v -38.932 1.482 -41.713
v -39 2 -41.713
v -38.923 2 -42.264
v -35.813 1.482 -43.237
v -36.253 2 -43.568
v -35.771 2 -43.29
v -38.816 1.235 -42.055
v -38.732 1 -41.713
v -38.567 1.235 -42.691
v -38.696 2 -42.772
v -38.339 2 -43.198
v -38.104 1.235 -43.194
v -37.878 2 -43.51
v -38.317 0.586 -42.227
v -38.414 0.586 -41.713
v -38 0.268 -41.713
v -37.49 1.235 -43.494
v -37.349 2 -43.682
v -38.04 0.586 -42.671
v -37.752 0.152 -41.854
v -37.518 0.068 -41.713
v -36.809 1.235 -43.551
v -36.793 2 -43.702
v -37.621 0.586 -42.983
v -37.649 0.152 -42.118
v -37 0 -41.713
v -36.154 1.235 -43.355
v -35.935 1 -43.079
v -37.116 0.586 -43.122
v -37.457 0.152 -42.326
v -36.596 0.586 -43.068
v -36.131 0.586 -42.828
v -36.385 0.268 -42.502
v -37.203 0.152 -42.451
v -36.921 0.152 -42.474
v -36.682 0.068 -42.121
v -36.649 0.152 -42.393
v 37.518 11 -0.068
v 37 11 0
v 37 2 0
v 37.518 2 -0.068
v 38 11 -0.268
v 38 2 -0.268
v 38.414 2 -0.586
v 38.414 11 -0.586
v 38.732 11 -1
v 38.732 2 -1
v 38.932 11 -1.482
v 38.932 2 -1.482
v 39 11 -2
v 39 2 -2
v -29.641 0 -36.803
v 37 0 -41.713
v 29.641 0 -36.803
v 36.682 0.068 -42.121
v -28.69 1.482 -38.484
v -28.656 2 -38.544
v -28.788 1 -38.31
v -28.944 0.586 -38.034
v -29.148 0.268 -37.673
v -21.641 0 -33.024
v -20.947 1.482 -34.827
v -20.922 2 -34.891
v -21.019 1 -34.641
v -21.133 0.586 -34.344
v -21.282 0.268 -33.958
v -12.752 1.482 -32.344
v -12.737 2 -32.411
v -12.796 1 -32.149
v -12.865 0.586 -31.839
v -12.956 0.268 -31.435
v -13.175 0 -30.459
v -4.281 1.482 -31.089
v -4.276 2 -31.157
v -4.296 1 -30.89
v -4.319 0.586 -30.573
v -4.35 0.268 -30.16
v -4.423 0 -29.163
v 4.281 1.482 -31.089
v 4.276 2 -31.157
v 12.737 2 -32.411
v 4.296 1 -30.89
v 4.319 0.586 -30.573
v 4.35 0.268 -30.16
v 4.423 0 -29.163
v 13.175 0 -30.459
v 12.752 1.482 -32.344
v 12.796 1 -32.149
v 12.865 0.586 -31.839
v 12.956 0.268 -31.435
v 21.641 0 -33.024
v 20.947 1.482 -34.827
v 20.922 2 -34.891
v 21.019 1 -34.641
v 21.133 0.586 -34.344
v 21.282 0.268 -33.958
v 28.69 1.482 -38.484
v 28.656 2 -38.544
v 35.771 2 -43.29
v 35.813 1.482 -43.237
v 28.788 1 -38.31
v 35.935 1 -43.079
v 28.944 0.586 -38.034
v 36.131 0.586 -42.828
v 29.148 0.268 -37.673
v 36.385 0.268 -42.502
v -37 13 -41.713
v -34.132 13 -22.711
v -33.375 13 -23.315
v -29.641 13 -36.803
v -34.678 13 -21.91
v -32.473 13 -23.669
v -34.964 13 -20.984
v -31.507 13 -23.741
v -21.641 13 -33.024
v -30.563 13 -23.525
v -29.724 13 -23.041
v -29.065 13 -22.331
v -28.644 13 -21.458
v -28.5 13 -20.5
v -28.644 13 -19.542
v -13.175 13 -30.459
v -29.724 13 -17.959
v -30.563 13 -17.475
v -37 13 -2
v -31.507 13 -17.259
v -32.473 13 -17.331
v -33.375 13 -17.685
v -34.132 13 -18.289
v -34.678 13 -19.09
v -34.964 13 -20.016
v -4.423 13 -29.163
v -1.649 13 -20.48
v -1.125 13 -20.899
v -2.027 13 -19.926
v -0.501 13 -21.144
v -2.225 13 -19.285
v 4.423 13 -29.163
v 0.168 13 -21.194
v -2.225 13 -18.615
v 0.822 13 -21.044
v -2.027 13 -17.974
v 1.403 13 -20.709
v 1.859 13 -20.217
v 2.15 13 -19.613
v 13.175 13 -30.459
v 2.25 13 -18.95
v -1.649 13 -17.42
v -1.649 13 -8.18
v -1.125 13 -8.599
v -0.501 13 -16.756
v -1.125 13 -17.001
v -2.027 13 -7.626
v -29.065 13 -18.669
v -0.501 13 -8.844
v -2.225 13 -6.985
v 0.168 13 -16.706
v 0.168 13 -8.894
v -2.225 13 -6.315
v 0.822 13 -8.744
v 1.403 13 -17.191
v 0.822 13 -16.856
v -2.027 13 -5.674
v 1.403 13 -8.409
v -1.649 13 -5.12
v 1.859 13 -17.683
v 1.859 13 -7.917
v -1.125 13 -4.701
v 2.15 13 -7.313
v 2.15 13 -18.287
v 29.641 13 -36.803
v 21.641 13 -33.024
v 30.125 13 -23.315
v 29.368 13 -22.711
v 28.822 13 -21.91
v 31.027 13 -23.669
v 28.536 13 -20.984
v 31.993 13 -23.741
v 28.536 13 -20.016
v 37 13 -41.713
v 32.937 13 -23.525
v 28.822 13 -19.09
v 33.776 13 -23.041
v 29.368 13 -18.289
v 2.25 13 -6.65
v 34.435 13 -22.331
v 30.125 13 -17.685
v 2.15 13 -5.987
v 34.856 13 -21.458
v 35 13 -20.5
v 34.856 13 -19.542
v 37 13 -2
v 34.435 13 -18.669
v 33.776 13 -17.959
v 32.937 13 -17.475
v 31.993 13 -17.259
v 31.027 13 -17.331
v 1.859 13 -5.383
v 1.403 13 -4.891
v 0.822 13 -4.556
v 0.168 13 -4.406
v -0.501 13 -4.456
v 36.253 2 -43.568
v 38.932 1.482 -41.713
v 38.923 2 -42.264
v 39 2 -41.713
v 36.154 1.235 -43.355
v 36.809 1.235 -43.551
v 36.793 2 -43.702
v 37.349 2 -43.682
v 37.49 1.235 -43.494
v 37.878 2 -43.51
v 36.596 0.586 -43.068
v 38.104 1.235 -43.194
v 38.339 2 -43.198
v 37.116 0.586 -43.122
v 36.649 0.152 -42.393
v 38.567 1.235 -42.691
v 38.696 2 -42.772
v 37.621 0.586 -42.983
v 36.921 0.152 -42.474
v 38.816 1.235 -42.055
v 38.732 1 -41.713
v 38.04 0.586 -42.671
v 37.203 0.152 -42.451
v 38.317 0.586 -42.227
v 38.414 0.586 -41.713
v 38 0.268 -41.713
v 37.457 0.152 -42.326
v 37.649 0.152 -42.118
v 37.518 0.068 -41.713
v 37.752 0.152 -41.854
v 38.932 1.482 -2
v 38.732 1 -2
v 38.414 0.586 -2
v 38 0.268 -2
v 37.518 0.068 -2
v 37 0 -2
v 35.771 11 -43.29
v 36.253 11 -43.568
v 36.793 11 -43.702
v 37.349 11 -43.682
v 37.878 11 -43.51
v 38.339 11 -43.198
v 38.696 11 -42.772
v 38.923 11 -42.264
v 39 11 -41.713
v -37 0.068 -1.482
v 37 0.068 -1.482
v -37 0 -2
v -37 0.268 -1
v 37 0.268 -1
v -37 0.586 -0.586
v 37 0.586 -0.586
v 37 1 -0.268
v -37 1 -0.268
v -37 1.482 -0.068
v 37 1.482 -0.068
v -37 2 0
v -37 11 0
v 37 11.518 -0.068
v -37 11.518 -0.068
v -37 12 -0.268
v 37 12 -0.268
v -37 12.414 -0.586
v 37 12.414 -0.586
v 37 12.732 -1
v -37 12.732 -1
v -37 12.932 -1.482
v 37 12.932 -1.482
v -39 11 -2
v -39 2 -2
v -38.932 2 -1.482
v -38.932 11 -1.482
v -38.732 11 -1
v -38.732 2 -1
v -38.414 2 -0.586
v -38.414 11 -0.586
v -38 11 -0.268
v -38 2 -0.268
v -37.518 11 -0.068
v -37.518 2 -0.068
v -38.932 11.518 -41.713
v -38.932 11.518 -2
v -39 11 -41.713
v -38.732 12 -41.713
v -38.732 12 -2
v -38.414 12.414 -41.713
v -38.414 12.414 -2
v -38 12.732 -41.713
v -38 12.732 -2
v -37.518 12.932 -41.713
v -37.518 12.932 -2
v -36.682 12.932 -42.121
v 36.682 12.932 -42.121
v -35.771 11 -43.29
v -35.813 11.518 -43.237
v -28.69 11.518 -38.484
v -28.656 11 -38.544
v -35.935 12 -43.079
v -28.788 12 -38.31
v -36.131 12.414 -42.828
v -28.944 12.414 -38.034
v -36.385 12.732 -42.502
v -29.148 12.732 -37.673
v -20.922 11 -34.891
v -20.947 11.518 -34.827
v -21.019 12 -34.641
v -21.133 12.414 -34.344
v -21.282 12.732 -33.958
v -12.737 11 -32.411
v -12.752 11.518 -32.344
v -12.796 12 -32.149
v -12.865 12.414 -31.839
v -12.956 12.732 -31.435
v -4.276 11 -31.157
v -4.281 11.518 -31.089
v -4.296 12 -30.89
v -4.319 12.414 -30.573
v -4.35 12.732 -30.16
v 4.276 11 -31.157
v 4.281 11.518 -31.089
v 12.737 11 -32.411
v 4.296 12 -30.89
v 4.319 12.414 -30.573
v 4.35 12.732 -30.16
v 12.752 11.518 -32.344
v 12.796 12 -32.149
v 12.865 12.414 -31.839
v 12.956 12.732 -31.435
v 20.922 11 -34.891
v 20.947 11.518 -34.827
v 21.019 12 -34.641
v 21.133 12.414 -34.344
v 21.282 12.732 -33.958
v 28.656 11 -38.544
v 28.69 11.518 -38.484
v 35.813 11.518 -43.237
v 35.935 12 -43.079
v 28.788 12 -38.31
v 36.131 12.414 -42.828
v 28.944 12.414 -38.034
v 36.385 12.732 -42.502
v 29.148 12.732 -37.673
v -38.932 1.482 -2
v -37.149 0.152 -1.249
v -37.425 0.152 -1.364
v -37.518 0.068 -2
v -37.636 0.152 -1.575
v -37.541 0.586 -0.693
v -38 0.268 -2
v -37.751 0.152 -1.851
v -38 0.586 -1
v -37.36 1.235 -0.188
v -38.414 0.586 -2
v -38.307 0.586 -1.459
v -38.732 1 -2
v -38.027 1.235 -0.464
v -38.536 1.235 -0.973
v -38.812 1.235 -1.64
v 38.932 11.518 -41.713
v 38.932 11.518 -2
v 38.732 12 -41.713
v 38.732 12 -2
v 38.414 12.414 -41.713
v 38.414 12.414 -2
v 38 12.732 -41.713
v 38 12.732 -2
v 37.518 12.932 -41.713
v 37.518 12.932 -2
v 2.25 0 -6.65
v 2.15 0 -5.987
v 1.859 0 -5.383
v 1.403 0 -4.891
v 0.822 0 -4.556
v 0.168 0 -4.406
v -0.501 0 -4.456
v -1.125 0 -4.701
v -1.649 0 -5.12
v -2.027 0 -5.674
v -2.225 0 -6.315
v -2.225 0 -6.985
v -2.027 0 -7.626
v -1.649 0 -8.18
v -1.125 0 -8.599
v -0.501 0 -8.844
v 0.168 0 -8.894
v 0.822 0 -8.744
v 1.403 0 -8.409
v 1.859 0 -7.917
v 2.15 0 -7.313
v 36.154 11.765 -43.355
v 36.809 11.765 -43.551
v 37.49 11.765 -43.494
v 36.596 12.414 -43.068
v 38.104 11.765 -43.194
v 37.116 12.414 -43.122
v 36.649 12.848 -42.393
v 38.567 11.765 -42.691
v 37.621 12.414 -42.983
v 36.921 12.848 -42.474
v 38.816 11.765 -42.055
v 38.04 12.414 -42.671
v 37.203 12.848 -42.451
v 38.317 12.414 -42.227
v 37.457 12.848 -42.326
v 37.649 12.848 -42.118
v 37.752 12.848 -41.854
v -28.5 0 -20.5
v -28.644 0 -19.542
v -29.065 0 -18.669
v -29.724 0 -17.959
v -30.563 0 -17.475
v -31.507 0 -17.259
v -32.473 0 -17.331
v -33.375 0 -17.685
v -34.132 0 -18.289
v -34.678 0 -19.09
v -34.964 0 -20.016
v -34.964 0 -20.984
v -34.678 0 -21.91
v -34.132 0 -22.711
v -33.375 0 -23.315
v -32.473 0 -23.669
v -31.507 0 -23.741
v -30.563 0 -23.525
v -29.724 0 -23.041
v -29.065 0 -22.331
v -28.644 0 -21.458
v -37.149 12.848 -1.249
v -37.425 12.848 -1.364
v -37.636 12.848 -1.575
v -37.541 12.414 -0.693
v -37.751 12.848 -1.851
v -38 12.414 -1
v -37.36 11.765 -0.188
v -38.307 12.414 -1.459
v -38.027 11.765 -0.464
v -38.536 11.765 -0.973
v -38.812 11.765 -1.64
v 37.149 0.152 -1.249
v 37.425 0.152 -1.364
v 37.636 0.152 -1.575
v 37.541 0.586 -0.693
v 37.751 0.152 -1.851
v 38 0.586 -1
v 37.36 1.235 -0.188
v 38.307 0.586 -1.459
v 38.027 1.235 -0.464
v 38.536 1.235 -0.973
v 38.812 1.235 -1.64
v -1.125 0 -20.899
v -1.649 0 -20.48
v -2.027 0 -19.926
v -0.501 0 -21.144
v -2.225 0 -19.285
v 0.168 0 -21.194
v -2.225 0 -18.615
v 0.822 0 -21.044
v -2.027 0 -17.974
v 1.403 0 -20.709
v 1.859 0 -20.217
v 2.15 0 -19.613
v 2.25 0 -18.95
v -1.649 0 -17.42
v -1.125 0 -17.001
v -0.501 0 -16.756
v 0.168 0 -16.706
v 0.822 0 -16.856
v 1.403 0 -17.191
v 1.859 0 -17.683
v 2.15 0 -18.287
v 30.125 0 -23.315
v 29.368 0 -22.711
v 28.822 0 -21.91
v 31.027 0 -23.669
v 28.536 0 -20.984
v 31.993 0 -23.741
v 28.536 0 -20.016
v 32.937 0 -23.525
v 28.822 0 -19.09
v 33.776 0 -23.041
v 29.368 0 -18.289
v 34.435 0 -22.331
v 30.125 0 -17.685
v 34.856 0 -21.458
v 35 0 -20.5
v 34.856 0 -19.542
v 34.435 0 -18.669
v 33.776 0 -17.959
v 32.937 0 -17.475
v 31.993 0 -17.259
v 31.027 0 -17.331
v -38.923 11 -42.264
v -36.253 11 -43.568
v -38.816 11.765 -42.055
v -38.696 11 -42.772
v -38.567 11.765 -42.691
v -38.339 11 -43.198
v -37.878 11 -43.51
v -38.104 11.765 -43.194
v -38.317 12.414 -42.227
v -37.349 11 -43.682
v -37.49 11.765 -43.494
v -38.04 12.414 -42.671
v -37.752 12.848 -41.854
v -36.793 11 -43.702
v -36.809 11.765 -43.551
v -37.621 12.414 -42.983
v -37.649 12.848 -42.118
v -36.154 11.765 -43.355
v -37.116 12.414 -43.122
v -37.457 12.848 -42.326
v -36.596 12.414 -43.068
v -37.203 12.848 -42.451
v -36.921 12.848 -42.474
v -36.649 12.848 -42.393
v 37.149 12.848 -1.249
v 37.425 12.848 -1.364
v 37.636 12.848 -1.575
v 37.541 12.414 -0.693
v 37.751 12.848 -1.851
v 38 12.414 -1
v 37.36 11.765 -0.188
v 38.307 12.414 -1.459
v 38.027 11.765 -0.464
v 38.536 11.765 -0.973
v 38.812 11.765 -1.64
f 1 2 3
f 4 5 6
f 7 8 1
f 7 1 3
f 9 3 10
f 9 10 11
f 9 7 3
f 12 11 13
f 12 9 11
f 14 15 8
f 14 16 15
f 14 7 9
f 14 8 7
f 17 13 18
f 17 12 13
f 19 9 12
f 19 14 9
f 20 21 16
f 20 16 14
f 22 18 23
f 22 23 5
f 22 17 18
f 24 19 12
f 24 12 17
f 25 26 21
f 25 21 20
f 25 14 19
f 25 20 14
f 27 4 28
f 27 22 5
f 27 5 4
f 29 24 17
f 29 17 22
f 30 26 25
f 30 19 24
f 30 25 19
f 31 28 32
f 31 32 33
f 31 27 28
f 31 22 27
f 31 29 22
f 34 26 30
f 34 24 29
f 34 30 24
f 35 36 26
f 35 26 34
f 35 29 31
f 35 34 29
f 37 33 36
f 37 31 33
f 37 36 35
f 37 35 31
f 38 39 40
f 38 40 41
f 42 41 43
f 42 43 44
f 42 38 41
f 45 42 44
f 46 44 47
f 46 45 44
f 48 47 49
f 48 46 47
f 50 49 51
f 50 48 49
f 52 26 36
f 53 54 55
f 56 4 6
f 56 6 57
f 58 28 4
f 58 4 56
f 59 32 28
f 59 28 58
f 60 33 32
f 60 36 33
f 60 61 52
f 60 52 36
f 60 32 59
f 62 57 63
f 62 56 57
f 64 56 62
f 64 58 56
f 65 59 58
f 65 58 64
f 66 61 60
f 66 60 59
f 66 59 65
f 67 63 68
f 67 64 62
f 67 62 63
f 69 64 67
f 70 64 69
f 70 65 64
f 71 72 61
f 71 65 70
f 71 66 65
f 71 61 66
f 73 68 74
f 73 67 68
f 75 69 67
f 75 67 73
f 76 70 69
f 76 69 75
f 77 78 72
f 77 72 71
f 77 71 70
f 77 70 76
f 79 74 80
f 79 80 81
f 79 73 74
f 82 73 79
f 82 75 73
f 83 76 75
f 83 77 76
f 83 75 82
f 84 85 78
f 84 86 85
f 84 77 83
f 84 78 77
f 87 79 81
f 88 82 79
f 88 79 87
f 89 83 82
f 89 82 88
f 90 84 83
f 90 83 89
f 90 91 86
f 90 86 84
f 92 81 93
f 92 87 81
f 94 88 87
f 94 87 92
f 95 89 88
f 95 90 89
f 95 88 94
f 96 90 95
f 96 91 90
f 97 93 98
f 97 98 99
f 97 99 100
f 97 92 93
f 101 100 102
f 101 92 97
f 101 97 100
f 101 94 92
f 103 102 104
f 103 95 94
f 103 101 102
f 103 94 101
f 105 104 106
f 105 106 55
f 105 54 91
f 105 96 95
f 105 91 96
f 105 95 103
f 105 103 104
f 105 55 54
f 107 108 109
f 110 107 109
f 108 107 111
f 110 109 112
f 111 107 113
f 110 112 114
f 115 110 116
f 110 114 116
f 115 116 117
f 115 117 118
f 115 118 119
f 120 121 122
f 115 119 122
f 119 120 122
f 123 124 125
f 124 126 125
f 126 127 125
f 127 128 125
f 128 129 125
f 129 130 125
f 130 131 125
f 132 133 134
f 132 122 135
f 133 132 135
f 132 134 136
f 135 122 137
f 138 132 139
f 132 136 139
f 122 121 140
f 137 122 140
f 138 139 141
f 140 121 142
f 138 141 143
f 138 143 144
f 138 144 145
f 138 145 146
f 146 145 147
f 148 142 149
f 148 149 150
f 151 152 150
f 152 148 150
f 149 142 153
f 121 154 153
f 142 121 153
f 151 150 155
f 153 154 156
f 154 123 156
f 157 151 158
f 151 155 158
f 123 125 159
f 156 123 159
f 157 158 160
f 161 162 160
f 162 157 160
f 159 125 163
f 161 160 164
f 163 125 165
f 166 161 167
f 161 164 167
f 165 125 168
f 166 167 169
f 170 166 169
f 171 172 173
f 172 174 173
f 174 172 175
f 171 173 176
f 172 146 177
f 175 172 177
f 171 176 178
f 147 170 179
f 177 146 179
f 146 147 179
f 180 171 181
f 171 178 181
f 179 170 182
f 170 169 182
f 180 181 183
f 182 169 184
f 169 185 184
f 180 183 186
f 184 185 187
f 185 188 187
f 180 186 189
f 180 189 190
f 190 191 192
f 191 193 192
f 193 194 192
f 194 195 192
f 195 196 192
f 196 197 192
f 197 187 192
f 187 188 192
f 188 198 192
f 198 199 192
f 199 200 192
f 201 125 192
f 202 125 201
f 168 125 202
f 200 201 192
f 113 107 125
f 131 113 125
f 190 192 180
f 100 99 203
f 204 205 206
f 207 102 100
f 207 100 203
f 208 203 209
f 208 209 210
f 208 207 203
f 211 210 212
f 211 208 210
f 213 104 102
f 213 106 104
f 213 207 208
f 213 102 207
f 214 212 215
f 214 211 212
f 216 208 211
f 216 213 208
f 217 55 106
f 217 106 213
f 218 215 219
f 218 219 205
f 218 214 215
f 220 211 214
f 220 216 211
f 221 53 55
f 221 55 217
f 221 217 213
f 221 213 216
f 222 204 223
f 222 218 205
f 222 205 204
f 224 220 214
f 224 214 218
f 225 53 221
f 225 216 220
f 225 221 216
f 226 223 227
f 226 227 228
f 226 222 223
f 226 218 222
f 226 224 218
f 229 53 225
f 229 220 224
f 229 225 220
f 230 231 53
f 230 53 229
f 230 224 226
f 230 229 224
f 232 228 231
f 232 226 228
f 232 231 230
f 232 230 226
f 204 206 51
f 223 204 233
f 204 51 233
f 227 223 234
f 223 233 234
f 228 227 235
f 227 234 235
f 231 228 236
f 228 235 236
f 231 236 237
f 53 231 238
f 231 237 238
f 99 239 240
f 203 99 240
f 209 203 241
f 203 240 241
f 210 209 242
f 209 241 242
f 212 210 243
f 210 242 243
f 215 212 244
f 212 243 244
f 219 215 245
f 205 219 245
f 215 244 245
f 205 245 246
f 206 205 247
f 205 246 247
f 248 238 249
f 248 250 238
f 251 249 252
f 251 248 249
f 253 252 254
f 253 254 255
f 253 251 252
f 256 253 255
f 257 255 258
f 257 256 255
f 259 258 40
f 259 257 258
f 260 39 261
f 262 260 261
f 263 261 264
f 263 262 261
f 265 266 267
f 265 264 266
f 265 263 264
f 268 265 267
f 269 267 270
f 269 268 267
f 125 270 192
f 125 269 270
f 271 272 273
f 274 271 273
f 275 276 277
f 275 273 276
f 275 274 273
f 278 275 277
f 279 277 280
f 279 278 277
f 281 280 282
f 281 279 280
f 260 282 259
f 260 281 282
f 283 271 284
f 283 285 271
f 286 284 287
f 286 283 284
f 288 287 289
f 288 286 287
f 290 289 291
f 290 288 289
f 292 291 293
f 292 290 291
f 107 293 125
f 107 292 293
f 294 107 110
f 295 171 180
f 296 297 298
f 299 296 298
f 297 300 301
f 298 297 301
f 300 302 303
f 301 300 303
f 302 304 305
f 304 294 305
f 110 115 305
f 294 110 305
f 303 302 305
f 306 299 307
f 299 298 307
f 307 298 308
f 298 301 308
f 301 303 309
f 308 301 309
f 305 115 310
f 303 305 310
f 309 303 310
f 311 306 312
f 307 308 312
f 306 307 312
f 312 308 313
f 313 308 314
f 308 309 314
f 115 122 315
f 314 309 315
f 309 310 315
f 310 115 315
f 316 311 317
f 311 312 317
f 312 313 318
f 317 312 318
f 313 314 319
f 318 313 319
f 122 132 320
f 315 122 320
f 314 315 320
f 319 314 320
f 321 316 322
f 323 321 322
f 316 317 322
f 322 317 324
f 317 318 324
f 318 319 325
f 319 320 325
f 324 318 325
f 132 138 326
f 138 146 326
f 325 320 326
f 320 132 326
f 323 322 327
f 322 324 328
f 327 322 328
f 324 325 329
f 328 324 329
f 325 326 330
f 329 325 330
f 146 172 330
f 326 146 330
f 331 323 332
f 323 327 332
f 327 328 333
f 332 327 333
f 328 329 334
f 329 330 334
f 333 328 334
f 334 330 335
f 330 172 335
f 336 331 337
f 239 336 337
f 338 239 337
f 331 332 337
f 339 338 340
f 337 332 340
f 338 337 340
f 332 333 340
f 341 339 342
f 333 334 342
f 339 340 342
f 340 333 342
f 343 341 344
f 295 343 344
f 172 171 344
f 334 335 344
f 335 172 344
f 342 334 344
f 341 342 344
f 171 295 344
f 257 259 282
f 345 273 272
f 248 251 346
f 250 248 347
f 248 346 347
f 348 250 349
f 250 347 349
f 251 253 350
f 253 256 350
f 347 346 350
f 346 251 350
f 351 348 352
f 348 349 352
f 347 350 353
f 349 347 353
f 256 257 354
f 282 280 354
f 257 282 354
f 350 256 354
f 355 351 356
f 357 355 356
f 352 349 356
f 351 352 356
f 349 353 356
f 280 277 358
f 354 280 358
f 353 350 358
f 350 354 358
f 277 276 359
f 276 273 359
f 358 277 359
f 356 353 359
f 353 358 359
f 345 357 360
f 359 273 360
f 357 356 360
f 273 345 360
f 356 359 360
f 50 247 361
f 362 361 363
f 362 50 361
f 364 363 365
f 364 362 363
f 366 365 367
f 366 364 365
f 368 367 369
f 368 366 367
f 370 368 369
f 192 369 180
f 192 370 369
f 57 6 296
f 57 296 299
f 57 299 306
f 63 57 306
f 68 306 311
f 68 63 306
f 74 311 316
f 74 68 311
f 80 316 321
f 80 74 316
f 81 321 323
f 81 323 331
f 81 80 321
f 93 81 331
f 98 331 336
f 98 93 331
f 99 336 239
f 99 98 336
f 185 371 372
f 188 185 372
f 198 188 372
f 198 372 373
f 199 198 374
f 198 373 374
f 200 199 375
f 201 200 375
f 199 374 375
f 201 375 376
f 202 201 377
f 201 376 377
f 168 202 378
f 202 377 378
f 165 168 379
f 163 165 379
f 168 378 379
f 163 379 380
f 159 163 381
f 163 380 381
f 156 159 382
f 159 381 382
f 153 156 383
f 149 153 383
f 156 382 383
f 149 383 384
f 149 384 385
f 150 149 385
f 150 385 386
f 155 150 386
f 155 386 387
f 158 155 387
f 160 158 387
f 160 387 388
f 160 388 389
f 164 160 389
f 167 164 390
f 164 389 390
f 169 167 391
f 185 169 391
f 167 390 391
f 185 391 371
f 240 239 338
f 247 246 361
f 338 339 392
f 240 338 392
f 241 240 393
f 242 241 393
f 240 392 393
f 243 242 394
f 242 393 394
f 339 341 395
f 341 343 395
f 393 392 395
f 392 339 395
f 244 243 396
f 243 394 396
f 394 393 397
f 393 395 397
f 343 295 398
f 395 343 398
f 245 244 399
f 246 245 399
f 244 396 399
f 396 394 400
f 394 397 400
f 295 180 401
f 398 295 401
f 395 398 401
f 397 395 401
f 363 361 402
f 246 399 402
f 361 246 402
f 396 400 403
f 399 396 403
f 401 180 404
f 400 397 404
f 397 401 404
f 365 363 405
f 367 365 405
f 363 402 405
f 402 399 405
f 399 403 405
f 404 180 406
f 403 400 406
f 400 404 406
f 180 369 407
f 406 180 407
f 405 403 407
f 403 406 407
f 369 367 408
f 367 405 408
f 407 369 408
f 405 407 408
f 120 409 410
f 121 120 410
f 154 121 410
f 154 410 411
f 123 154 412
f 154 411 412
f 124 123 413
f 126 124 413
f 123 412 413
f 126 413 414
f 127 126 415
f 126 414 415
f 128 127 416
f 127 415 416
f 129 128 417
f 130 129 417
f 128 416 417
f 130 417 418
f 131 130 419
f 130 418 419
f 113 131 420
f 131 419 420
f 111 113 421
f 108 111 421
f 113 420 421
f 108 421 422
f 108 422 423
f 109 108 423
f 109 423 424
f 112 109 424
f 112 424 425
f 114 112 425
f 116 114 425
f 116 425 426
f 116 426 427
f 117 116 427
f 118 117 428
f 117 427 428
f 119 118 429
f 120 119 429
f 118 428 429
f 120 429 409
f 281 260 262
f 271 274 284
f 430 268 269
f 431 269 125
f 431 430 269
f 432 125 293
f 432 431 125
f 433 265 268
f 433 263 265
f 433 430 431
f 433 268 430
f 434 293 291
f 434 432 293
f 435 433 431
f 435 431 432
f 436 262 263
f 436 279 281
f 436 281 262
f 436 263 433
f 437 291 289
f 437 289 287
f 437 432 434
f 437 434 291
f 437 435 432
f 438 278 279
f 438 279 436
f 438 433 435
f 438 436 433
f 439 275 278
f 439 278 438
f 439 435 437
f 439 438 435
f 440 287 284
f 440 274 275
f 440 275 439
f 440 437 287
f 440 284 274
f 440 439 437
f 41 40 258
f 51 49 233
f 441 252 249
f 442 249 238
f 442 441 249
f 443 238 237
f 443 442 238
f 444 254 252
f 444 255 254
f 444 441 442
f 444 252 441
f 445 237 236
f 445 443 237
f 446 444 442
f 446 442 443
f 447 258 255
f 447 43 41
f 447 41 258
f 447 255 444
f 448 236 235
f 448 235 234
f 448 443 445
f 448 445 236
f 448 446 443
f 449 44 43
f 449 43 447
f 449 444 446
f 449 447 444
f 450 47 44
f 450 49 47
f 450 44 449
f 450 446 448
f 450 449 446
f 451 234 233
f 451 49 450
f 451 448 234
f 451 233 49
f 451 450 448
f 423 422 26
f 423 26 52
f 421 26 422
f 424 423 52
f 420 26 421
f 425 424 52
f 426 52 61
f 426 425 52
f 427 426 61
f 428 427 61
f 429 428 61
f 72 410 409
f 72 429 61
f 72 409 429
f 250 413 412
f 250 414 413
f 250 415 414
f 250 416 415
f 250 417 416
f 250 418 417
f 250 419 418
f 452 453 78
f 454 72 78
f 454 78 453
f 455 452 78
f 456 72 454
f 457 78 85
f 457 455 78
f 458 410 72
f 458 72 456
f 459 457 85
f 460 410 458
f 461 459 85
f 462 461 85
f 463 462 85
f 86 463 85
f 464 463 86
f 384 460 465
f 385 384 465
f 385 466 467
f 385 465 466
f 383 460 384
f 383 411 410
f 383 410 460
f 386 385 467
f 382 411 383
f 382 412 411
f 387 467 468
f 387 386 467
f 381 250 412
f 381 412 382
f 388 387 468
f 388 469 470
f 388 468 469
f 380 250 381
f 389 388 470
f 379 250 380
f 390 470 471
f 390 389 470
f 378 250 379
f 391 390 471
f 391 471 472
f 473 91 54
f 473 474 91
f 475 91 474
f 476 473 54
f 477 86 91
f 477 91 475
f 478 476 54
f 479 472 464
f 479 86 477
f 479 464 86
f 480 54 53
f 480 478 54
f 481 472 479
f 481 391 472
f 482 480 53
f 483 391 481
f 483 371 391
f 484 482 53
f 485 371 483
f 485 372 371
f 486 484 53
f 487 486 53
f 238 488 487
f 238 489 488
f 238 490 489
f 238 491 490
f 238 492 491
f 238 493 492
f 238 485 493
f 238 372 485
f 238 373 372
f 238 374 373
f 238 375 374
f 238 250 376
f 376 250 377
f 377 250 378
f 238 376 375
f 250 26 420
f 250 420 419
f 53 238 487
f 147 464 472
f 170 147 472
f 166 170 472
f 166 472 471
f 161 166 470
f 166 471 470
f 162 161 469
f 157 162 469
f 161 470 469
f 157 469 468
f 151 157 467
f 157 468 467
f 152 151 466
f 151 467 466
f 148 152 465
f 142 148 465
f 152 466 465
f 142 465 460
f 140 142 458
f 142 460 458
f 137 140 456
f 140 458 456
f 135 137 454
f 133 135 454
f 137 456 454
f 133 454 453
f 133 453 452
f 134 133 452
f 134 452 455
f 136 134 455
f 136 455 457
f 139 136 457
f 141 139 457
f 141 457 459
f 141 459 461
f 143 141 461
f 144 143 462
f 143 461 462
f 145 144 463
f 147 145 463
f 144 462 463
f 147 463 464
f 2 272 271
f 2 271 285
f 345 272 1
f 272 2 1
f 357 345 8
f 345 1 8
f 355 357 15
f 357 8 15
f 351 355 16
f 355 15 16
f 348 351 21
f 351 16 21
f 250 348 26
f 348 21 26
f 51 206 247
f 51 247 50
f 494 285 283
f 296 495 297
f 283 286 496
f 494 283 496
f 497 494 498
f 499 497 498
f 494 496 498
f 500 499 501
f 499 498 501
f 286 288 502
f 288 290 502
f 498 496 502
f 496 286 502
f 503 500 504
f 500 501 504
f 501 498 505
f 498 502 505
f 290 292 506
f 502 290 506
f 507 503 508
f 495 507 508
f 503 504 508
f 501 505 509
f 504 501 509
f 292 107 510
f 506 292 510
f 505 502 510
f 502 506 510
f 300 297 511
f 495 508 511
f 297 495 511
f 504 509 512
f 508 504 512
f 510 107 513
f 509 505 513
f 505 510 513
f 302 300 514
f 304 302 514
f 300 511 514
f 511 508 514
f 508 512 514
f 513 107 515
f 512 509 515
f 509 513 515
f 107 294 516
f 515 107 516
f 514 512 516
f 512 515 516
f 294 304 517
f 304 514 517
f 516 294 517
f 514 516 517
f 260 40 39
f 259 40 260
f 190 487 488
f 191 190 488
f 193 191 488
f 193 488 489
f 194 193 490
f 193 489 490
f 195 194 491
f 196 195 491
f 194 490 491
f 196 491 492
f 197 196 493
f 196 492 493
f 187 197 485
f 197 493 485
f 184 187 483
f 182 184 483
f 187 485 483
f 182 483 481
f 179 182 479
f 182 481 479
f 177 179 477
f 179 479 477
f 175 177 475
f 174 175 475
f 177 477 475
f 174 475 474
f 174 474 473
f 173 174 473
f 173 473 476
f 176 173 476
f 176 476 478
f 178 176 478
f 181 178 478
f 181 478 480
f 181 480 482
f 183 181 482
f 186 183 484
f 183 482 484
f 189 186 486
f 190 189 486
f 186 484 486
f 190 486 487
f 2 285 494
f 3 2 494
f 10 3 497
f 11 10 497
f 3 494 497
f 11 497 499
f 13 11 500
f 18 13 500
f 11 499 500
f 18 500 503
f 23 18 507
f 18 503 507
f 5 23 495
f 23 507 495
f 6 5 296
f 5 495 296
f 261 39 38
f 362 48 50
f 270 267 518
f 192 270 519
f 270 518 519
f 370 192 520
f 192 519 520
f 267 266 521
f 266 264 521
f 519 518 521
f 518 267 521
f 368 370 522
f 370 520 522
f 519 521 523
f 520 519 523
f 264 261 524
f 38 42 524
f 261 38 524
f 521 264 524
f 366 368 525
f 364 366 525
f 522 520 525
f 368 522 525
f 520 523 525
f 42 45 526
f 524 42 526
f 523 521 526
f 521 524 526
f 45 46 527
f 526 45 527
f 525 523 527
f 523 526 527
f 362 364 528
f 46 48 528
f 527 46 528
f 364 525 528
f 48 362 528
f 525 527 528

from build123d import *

# Parameters (mm, degrees)
F0_R     = 3.25
F0_R_2   = 2.25
F1_DEPTH = 13
F2_R     = 2
F3_R     = 2


with BuildPart() as f1:
    # F0 (on Front) → F1 (new body)
    with BuildSketch(Plane.XZ):
        with BuildLine():
            Line((-39, 0), (-39, -46))
            ThreePointArc((-39, -46), (0, -31), (39, -46))
            Line((39, -46), (39, 0))
            Line((39, 0), (-39, 0))
        make_face()
        with Locations((-31.75, -20.5)):
            Circle(F0_R, mode=Mode.SUBTRACT)
        with Locations((0, -18.95)):
            Circle(F0_R_2, mode=Mode.SUBTRACT)
        with Locations((31.75, -20.5)):
            Circle(F0_R, mode=Mode.SUBTRACT)
        with Locations((0, -6.65)):
            Circle(F0_R_2, mode=Mode.SUBTRACT)
    extrude(amount=-F1_DEPTH)

    # F2
    f2_edges = [f1.edges().sort_by_distance(p)[0] for p in [
        (-39, 6.5, -46),
        (39, 6.5, -46),
    ]]
    fillet(f2_edges, radius=F2_R)

    # F3
    f3_edges = [f1.edges().sort_by_distance(p)[0] for p in [
        (-39, 6.5, 0),
        (39, 6.5, 0),
        (0, 0, 0),
        (0, 13, 0),
        (-39, 0, -20.856369),
        (-39, 6.5, -41.712739),
        (-39, 13, -20.856369),
    ]]
    fillet(f3_edges, radius=F3_R)


solid = f1.part
